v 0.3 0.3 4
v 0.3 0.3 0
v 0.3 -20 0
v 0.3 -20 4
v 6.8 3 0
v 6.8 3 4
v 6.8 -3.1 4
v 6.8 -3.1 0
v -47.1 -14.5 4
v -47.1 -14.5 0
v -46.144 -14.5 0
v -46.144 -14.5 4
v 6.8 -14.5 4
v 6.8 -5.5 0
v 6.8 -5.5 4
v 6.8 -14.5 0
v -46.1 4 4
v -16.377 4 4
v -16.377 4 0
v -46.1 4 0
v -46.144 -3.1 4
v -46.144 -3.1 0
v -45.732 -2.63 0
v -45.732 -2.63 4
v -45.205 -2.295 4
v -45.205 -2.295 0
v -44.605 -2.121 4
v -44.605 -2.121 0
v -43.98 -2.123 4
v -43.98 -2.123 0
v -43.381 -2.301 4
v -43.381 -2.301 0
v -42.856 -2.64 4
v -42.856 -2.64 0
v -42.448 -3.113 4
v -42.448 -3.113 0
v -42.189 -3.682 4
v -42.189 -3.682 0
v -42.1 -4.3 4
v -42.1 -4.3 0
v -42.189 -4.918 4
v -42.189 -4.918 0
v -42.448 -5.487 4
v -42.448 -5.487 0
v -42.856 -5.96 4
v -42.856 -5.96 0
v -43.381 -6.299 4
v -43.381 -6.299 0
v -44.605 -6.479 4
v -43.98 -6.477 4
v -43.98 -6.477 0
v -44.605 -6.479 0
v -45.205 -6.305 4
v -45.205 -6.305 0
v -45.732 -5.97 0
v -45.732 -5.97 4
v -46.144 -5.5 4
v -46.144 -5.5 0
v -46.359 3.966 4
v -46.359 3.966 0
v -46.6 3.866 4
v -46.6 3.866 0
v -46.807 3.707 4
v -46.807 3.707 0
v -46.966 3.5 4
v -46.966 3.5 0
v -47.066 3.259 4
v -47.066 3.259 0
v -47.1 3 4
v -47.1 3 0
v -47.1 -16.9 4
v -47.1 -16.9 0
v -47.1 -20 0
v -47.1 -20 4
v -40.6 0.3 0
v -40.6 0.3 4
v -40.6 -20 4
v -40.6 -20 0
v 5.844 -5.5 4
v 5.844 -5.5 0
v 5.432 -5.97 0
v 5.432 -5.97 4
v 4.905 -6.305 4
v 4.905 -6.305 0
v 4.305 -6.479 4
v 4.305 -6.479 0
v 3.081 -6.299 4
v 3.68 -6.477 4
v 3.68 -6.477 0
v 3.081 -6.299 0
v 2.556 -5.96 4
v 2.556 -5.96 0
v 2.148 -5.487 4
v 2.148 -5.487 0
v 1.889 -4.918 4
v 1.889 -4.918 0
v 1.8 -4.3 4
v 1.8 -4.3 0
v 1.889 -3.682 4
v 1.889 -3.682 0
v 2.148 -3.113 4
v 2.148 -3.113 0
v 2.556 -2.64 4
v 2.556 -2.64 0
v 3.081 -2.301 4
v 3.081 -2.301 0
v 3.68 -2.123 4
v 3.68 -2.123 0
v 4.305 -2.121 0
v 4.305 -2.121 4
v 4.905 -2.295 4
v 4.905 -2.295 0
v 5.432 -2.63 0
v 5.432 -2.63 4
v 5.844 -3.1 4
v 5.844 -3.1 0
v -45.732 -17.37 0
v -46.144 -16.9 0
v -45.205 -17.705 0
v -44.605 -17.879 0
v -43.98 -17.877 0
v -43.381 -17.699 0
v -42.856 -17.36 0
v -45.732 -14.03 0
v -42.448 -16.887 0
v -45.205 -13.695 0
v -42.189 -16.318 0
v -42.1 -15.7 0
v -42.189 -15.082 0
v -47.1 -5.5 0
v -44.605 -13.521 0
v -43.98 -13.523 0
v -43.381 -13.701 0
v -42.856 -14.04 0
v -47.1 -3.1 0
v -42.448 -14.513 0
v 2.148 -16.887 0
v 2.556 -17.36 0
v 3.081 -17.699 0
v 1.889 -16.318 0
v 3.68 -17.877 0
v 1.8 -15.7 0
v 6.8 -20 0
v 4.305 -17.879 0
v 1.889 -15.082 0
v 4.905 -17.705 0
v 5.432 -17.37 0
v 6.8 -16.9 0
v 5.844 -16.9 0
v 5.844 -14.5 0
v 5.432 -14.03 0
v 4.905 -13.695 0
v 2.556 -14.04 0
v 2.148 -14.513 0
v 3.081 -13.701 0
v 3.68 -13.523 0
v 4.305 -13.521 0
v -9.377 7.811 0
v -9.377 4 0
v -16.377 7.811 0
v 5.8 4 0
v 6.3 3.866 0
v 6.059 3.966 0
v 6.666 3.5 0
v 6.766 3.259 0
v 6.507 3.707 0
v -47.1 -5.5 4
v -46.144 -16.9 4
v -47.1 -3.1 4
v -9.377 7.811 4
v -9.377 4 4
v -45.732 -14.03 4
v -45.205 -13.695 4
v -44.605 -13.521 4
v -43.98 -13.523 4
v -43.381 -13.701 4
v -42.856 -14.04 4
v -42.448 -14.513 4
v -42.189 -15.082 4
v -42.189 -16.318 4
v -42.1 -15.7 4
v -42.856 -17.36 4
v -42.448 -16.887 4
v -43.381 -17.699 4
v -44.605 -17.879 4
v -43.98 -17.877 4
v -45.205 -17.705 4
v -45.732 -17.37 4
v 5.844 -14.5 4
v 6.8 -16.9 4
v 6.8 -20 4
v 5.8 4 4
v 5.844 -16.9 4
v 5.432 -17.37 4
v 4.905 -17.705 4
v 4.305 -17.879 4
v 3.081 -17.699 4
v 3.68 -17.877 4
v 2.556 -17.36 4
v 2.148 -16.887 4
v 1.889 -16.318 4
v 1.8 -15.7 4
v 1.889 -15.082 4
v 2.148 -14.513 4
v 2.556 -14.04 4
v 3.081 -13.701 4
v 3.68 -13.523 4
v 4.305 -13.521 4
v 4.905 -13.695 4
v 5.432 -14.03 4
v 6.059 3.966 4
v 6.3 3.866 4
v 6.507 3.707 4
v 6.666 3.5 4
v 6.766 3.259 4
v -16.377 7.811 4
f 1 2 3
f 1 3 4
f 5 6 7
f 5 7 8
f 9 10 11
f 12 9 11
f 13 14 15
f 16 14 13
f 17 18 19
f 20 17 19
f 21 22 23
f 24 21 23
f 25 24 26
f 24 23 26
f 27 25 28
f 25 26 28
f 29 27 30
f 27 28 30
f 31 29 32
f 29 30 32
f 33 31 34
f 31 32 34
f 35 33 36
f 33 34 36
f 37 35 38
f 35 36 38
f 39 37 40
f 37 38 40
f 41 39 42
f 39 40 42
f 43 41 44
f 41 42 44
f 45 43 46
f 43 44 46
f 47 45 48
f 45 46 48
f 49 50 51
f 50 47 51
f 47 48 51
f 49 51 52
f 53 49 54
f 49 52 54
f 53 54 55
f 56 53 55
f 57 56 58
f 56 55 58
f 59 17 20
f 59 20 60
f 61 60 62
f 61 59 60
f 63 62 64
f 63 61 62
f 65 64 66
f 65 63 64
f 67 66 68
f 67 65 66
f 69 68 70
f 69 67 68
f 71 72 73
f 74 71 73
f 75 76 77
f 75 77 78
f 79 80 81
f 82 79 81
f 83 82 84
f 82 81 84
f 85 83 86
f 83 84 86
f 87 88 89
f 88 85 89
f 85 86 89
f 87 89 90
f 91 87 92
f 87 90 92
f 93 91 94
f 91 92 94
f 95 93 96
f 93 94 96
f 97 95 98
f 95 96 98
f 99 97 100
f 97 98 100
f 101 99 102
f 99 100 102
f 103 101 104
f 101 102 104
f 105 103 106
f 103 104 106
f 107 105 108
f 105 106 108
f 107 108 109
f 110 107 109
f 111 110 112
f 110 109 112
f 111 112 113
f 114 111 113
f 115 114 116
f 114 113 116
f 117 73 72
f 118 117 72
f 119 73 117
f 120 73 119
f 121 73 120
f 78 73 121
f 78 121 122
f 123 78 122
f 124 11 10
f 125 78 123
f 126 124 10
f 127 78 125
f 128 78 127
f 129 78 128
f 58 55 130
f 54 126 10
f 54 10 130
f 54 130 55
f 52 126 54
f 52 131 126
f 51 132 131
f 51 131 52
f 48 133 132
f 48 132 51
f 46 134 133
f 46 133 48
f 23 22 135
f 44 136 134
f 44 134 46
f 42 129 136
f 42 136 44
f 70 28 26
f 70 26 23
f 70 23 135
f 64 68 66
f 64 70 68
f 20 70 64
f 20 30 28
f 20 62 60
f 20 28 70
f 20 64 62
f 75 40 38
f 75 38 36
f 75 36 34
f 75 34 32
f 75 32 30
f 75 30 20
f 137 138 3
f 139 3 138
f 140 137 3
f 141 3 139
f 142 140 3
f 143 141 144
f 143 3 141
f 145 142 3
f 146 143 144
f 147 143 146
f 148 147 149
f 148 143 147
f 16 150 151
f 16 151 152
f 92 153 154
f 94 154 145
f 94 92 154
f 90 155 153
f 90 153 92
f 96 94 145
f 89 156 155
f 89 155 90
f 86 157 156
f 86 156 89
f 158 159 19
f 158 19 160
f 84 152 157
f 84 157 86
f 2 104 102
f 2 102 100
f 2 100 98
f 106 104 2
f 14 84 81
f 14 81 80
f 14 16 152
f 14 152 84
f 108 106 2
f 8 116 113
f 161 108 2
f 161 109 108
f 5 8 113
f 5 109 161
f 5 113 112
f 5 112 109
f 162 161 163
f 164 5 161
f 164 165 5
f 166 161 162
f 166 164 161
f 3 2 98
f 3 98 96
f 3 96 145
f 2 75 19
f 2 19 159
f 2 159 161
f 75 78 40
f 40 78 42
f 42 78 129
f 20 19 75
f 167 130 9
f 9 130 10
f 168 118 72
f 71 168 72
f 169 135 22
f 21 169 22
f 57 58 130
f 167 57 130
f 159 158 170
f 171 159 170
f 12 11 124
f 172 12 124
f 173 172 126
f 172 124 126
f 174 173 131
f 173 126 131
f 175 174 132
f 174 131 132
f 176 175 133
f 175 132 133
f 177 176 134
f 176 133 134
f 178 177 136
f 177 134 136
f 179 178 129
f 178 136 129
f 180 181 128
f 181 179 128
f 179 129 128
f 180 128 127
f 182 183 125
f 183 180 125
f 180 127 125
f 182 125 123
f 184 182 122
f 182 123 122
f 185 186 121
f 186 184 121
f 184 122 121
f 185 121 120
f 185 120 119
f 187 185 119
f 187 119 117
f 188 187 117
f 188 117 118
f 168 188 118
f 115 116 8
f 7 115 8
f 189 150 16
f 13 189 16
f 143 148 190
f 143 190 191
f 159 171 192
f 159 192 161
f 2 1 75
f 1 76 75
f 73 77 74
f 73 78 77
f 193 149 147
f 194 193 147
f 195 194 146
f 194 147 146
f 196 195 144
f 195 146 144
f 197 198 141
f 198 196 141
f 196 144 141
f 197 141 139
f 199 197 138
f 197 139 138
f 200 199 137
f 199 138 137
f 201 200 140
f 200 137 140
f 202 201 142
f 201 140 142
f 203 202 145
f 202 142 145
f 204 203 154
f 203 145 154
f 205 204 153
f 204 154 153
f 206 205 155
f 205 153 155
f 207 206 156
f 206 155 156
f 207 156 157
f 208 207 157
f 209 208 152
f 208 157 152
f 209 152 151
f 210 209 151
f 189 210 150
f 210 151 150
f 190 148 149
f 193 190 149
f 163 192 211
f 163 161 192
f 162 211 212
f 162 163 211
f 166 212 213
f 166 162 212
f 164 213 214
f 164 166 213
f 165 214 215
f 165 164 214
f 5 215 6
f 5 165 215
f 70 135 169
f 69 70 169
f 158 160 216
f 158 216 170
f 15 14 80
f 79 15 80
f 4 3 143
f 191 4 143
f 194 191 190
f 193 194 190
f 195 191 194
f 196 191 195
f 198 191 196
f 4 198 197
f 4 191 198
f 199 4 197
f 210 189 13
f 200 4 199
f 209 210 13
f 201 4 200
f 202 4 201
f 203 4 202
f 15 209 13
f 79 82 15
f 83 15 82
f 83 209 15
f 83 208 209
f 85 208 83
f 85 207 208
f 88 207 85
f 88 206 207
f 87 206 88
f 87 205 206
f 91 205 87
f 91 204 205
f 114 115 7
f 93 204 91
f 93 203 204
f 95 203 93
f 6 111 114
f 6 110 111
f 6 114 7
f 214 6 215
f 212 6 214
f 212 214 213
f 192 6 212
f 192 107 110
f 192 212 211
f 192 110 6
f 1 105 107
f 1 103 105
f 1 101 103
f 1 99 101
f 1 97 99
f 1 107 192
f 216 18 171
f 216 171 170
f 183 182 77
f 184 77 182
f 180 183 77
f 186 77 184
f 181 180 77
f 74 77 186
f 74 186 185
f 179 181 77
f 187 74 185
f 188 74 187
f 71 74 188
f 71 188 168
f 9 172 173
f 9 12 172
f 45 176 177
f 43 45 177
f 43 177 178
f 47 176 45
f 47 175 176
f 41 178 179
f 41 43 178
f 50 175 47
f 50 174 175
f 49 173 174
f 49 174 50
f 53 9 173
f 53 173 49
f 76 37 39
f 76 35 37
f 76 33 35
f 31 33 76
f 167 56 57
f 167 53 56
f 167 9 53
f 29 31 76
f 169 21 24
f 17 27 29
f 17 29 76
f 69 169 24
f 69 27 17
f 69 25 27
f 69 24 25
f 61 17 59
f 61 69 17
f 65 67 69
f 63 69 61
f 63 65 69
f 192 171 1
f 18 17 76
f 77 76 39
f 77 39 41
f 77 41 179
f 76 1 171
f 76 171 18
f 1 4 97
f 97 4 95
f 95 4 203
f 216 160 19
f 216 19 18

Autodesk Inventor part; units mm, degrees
ref_plane "YZ Plane" through (0, 0, 0) normal (1, 0, 0) x (0, 1, 0)
sketch "Sketch1" plane through (0, 0, 0) normal (0, 0, 1) x (1, 0, 0)
  line L0 (5.8439, -14.5) -> (6.8, -14.5) projected
  line L1 (6.8, -5.5) -> (6.8, -14.5) projected
  line L2 (6.8, -5.5) -> (5.8439, -5.5) projected
  arc A0 (5.8439, -3.1) -> (5.8439, -5.5) centre (4, -4.3) ccw projected
  line L3 (5.8439, -3.1) -> (6.8, -3.1) projected
  line L4 (6.8, 0) -> (6.8, -3.1) projected
  line L5 (0, 0) -> (6.8, 0) projected
  line L6 (0, -20) -> (0, 0) projected
  line L7 (0, -20) -> (6.8, -20) projected
  line L8 (6.8, -16.9) -> (6.8, -20) projected
  line L9 (6.8, -16.9) -> (5.8439, -16.9) projected
  arc A1 (5.8439, -14.5) -> (5.8439, -16.9) centre (4, -15.7) ccw projected
  line L10 (-47.1, -14.5) -> (-46.1439, -14.5) projected
  arc A2 (-46.1439, -16.9) -> (-46.1439, -14.5) centre (-44.3, -15.7) ccw projected
  line L11 (-46.1439, -16.9) -> (-47.1, -16.9) projected
  line L12 (-47.1, -16.9) -> (-47.1, -20) projected
  line L13 (-40.3, -20) -> (-47.1, -20) projected
  line L14 (-40.3, 0) -> (-40.3, -20) projected
  line L15 (-40.3, 0) -> (-47.1, 0) projected
  line L16 (-47.1, 0) -> (-47.1, -3.1) projected
  line L17 (-47.1, -3.1) -> (-46.1439, -3.1) projected
  arc A3 (-46.1439, -5.5) -> (-46.1439, -3.1) centre (-44.3, -4.3) ccw projected
  line L18 (-46.1439, -5.5) -> (-47.1, -5.5) projected
  line L19 (-47.1, -5.5) -> (-47.1, -14.5) projected
extrude "Extrusion1" add sketch "Sketch1" along normal blind 4
sketch "Sketch2" plane through (0, 0, 0) normal (0, 1, 0) x (1, 0, 0)
  line L0 (0, 0) -> (6.8, 0) projected
  line L1 (0, 0) -> (0, -4) projected
  line L2 (6.8, -4) -> (0, -4) projected
  line L3 (6.8, 0) -> (6.8, -4) projected
  line L4 (-47.1, 0) -> (-47.1, -4) projected
  line L5 (-40.3, -4) -> (-47.1, -4) projected
  line L6 (6.8, 0) -> (-47.1, 0)
  line L7 (-47.1, 0) -> (-47.1, -4)
  line L8 (-47.1, -4) -> (6.8, -4)
  line L9 (6.8, -4) -> (6.8, 0)
extrude "Extrusion2" add sketch "Sketch2" along normal blind 4 contours L1 L8 L5 L4 L6
sketch "Sketch3" plane through (0, 0, 4) normal (1, 0, 0) x (0, 0, -1)
  line L0 (4, 0) -> (0, 0) projected
  line L1 (4, 4) -> (4, 0) projected
  line L2 (0, 4) -> (4, 4) projected
  line L3 (0, 0) -> (0, 4) projected
extrude "Extrusion3" add sketch "Sketch3" along normal up to surface (6.8 mm away)
sketch "Sketch4" plane through (0, 4, 0) normal (0, 1, 0) x (1, 0, 0)
  line L0 (6.8, 0) -> (-47.1, 0) projected
  line L1 (-47.1, -4) -> (6.8, -4) projected
  line L2 (-9.3767, -8.1) -> (-9.3767, -13.1) construction
  line L3 (-21.8189, -8.1) -> (-9.3767, -8.1) construction
  arc A0 (-17.3767, -8.1) -> (-40.8, 16.4941) centre (-48.3, -14.1) ccw construction
  line L4 (-9.3767, -4) -> (-16.3767, -4) construction
  line L5 (-16.3767, -4) -> (-16.3767, -8.1) construction
  line L6 (-16.3767, -8.1) -> (-9.3767, -8.1) construction
  line L7 (-9.3767, -8.1) -> (-9.3767, -4) construction
  line L8 (-9.3767, -4) -> (-16.3767, -4)
  line L9 (-16.3767, -4) -> (-16.3767, 0)
  line L10 (-16.3767, 0) -> (-9.3767, 0)
  line L11 (-9.3767, 0) -> (-9.3767, -4)
  point P0 (0, 0)
  dimension "d6" = 7
ref_plane "Work Plane1" through (-21.8189, 29, 8.1) normal (0, 1, 0) x (0, 0, 1)
extrude "Extrusion4" add sketch "Sketch4" along normal up to surface (25 mm away)
sketch "Sketch5" plane through (0, 0, 4) normal (0, 0, 1) x (1, 0, 0)
  circle A0 centre (-13.3767, 24) radius 2 construction
  line L0 (-21.8189, 24) -> (-17.3767, 24) construction
  line L1 (-21.8189, 24) -> (-21.8189, 29) construction
  line L2 (-21.8189, 29) -> (-9.3767, 29) construction
  line L3 (-9.3767, 19) -> (-9.3767, 29) construction
  line L4 (-17.3767, 19) -> (-9.3767, 19) construction
  line L5 (-17.3767, 24) -> (-17.3767, 19) construction
  line L6 (-9.3767, 19) -> (-16.3767, 19) construction
  line L7 (-16.3767, 19) -> (-16.3767, 29) construction
  line L8 (-16.3767, 29) -> (-9.3767, 29) construction
  line L9 (-9.3767, 29) -> (-9.3767, 19) construction
  line L10 (-9.3767, 19) -> (-16.3767, 19)
  line L11 (-16.3767, 19) -> (-16.3767, 29)
  line L12 (-16.3767, 29) -> (-9.3767, 29)
  line L13 (-9.3767, 29) -> (-9.3767, 19)
  circle A1 centre (-13.3767, 24) radius 2
ref_plane "Work Plane2" through (-21.8189, 19, 8.1) normal (0, 0, -1) x (0, 1, 0)
extrude "Extrusion5" add sketch "Sketch5" along normal up to surface (4.1 mm away)
sketch "Sketch6" plane through (-16.3767, 19, 8.1) normal (-1, 0, 0) x (0, 0, 1)
  line L0 (0, 5) -> (-24.5941, 5) construction
  line L1 (0, 0) -> (-24.5941, 0) construction
  line L2 (-8.1, 10) -> (0.5132, 10) construction
  line L3 (0.5132, 10) -> (0.5132, 5) construction
  line L4 (0.5132, 5) -> (-8.1, 5) construction
  line L5 (-8.1, 5) -> (-8.1, 10) construction
  line L6 (-8.1, 10) -> (0, 10)
  line L7 (0, 10) -> (0, 5)
  line L8 (0, 5) -> (-8.1, 5)
  line L9 (-8.1, 5) -> (-8.1, 10)
  point P0 (-8.1, -19)
extrude "Extrusion6" add sketch "Sketch6" along normal blind 5
sketch "Sketch7" plane through (-16.3767, 24, 0) normal (0, -1, 0) x (1, 0, 0)
  line L0 (0, 8.1) -> (0, 0) projected
  line L1 (0, 8.1) -> (-5, 8.1) projected
  line L2 (-5, 0) -> (-5, 8.1) projected
  line L3 (0, 0) -> (-5, 0) projected
  point P0 (16.3767, 0)
extrude "Extrusion7" cut sketch "Sketch7" against normal blind 0.4
sketch "Sketch8" plane through (0, 0, 0) normal (0, 0, -1) x (-1, 0, 0)
  circle A0 centre (13.3767, 24) radius 2 construction
  circle A1 centre (13.3767, 24) radius 2 projected
extrude "Extrusion8" cut sketch "Sketch8" against normal blind 4
fillet "Fillet3" radius 1 1 edges at (-16.3767, 24.4, 4.05)
sketch "Sketch9" plane through (-9.3767, 19, 8.1) normal (1, 0, 0) x (0, 0, -1)
  line L0 (0, 0) -> (0, 10) projected
  line L1 (8.1, 7) -> (0, 7) construction
  line L2 (8.1, 3) -> (0, 3) construction
  line L3 (24.5941, 5) -> (0, 5) construction
  line L4 (-5, 5) -> (0, 5) construction
  line L5 (4, 8.75) -> (7.5, 8.75)
  line L6 (7.5, 8.75) -> (7.5, 1.25)
  line L7 (7.5, 1.25) -> (4, 1.25)
  line L8 (4, 1.25) -> (4, 8.75)
  point P0 (8.1, -19)
  point P1 (4, 5)
  dimension "d20" = 3.5
  dimension "d21" = 7.5
  dimension "d22" = 4
extrude "Extrusion9" cut sketch "Sketch9" against normal blind 7.5
sketch "Sketch10" plane through (-16.3767, 19, 4) normal (0, -1, 0) x (1, 0, 0)
  line L0 (0, 4.1) -> (7, 4.1) projected
  line L1 (0, 0) -> (0, 4.1) projected
  line L2 (7, 0) -> (0, 0) projected
  line L3 (7, 0) -> (7, 4.1) projected
  point P0 (16.3767, -4)
extrude "Extrusion10" add sketch "Sketch10" along normal blind 3
fillet "Fillet4" radius 3 1 edges at (-12.8767, 16, 4)
sketch "Sketch11" plane through (0, 0, 0) normal (0, -1, 0) x (1, 0, 0)
  line L0 (-40.3, 0) -> (-40.3, 4) projected
  line L1 (0, 0) -> (-40.3, 0) projected
  line L2 (0, 0) -> (0, 4) projected
  line L3 (-40.3, 4) -> (0, 4) projected
extrude "Extrusion11" cut sketch "Sketch11" against normal blind 0.3
sketch "Sketch12" plane through (0, -20, 0) normal (-1, 0, 0) x (0, 0, 1)
  line L0 (0, 0) -> (0, 20.3) projected
  line L1 (0, 0) -> (4, 0) projected
  line L2 (4, 20.3) -> (4, 0) projected
  line L3 (4, 20.3) -> (0, 20.3) projected
  point P0 (0, 20)
extrude "Extrusion12" cut sketch "Sketch12" against normal blind 0.3
sketch "Sketch13" plane through (-40.3, -20, 4) normal (1, 0, 0) x (0, 0, -1)
  line L0 (4, 0) -> (4, 20.3) projected
  line L1 (4, 20.3) -> (0, 20.3) projected
  line L2 (0, 0) -> (0, 20.3) projected
  line L3 (4, 0) -> (0, 0) projected
  point P0 (4, 20)
extrude "Extrusion13" cut sketch "Sketch13" against normal blind 0.3
fillet "Fillet5" radius 1 2 edges at (6.8, 4, 2) (-47.1, 4, 2)
sketch "Sketch15" plane through (0, 0, 0) normal (0, 0, -1) x (-1, 0, 0)
  circle A0 centre (13.3767, 24) radius 2 projected
  line L0 (9.3767, 29) -> (21.3767, 29)
  line L1 (21.3767, 29) -> (21.3767, 7.8113)
  line L2 (21.3767, 7.8113) -> (9.3767, 7.8113)
  line L3 (9.3767, 7.8113) -> (9.3767, 29)
  point P0 (0, 0)
extrude "Extrusion14" cut sketch "Sketch15" against normal through all
properties part number "MG996RBracketTop"
